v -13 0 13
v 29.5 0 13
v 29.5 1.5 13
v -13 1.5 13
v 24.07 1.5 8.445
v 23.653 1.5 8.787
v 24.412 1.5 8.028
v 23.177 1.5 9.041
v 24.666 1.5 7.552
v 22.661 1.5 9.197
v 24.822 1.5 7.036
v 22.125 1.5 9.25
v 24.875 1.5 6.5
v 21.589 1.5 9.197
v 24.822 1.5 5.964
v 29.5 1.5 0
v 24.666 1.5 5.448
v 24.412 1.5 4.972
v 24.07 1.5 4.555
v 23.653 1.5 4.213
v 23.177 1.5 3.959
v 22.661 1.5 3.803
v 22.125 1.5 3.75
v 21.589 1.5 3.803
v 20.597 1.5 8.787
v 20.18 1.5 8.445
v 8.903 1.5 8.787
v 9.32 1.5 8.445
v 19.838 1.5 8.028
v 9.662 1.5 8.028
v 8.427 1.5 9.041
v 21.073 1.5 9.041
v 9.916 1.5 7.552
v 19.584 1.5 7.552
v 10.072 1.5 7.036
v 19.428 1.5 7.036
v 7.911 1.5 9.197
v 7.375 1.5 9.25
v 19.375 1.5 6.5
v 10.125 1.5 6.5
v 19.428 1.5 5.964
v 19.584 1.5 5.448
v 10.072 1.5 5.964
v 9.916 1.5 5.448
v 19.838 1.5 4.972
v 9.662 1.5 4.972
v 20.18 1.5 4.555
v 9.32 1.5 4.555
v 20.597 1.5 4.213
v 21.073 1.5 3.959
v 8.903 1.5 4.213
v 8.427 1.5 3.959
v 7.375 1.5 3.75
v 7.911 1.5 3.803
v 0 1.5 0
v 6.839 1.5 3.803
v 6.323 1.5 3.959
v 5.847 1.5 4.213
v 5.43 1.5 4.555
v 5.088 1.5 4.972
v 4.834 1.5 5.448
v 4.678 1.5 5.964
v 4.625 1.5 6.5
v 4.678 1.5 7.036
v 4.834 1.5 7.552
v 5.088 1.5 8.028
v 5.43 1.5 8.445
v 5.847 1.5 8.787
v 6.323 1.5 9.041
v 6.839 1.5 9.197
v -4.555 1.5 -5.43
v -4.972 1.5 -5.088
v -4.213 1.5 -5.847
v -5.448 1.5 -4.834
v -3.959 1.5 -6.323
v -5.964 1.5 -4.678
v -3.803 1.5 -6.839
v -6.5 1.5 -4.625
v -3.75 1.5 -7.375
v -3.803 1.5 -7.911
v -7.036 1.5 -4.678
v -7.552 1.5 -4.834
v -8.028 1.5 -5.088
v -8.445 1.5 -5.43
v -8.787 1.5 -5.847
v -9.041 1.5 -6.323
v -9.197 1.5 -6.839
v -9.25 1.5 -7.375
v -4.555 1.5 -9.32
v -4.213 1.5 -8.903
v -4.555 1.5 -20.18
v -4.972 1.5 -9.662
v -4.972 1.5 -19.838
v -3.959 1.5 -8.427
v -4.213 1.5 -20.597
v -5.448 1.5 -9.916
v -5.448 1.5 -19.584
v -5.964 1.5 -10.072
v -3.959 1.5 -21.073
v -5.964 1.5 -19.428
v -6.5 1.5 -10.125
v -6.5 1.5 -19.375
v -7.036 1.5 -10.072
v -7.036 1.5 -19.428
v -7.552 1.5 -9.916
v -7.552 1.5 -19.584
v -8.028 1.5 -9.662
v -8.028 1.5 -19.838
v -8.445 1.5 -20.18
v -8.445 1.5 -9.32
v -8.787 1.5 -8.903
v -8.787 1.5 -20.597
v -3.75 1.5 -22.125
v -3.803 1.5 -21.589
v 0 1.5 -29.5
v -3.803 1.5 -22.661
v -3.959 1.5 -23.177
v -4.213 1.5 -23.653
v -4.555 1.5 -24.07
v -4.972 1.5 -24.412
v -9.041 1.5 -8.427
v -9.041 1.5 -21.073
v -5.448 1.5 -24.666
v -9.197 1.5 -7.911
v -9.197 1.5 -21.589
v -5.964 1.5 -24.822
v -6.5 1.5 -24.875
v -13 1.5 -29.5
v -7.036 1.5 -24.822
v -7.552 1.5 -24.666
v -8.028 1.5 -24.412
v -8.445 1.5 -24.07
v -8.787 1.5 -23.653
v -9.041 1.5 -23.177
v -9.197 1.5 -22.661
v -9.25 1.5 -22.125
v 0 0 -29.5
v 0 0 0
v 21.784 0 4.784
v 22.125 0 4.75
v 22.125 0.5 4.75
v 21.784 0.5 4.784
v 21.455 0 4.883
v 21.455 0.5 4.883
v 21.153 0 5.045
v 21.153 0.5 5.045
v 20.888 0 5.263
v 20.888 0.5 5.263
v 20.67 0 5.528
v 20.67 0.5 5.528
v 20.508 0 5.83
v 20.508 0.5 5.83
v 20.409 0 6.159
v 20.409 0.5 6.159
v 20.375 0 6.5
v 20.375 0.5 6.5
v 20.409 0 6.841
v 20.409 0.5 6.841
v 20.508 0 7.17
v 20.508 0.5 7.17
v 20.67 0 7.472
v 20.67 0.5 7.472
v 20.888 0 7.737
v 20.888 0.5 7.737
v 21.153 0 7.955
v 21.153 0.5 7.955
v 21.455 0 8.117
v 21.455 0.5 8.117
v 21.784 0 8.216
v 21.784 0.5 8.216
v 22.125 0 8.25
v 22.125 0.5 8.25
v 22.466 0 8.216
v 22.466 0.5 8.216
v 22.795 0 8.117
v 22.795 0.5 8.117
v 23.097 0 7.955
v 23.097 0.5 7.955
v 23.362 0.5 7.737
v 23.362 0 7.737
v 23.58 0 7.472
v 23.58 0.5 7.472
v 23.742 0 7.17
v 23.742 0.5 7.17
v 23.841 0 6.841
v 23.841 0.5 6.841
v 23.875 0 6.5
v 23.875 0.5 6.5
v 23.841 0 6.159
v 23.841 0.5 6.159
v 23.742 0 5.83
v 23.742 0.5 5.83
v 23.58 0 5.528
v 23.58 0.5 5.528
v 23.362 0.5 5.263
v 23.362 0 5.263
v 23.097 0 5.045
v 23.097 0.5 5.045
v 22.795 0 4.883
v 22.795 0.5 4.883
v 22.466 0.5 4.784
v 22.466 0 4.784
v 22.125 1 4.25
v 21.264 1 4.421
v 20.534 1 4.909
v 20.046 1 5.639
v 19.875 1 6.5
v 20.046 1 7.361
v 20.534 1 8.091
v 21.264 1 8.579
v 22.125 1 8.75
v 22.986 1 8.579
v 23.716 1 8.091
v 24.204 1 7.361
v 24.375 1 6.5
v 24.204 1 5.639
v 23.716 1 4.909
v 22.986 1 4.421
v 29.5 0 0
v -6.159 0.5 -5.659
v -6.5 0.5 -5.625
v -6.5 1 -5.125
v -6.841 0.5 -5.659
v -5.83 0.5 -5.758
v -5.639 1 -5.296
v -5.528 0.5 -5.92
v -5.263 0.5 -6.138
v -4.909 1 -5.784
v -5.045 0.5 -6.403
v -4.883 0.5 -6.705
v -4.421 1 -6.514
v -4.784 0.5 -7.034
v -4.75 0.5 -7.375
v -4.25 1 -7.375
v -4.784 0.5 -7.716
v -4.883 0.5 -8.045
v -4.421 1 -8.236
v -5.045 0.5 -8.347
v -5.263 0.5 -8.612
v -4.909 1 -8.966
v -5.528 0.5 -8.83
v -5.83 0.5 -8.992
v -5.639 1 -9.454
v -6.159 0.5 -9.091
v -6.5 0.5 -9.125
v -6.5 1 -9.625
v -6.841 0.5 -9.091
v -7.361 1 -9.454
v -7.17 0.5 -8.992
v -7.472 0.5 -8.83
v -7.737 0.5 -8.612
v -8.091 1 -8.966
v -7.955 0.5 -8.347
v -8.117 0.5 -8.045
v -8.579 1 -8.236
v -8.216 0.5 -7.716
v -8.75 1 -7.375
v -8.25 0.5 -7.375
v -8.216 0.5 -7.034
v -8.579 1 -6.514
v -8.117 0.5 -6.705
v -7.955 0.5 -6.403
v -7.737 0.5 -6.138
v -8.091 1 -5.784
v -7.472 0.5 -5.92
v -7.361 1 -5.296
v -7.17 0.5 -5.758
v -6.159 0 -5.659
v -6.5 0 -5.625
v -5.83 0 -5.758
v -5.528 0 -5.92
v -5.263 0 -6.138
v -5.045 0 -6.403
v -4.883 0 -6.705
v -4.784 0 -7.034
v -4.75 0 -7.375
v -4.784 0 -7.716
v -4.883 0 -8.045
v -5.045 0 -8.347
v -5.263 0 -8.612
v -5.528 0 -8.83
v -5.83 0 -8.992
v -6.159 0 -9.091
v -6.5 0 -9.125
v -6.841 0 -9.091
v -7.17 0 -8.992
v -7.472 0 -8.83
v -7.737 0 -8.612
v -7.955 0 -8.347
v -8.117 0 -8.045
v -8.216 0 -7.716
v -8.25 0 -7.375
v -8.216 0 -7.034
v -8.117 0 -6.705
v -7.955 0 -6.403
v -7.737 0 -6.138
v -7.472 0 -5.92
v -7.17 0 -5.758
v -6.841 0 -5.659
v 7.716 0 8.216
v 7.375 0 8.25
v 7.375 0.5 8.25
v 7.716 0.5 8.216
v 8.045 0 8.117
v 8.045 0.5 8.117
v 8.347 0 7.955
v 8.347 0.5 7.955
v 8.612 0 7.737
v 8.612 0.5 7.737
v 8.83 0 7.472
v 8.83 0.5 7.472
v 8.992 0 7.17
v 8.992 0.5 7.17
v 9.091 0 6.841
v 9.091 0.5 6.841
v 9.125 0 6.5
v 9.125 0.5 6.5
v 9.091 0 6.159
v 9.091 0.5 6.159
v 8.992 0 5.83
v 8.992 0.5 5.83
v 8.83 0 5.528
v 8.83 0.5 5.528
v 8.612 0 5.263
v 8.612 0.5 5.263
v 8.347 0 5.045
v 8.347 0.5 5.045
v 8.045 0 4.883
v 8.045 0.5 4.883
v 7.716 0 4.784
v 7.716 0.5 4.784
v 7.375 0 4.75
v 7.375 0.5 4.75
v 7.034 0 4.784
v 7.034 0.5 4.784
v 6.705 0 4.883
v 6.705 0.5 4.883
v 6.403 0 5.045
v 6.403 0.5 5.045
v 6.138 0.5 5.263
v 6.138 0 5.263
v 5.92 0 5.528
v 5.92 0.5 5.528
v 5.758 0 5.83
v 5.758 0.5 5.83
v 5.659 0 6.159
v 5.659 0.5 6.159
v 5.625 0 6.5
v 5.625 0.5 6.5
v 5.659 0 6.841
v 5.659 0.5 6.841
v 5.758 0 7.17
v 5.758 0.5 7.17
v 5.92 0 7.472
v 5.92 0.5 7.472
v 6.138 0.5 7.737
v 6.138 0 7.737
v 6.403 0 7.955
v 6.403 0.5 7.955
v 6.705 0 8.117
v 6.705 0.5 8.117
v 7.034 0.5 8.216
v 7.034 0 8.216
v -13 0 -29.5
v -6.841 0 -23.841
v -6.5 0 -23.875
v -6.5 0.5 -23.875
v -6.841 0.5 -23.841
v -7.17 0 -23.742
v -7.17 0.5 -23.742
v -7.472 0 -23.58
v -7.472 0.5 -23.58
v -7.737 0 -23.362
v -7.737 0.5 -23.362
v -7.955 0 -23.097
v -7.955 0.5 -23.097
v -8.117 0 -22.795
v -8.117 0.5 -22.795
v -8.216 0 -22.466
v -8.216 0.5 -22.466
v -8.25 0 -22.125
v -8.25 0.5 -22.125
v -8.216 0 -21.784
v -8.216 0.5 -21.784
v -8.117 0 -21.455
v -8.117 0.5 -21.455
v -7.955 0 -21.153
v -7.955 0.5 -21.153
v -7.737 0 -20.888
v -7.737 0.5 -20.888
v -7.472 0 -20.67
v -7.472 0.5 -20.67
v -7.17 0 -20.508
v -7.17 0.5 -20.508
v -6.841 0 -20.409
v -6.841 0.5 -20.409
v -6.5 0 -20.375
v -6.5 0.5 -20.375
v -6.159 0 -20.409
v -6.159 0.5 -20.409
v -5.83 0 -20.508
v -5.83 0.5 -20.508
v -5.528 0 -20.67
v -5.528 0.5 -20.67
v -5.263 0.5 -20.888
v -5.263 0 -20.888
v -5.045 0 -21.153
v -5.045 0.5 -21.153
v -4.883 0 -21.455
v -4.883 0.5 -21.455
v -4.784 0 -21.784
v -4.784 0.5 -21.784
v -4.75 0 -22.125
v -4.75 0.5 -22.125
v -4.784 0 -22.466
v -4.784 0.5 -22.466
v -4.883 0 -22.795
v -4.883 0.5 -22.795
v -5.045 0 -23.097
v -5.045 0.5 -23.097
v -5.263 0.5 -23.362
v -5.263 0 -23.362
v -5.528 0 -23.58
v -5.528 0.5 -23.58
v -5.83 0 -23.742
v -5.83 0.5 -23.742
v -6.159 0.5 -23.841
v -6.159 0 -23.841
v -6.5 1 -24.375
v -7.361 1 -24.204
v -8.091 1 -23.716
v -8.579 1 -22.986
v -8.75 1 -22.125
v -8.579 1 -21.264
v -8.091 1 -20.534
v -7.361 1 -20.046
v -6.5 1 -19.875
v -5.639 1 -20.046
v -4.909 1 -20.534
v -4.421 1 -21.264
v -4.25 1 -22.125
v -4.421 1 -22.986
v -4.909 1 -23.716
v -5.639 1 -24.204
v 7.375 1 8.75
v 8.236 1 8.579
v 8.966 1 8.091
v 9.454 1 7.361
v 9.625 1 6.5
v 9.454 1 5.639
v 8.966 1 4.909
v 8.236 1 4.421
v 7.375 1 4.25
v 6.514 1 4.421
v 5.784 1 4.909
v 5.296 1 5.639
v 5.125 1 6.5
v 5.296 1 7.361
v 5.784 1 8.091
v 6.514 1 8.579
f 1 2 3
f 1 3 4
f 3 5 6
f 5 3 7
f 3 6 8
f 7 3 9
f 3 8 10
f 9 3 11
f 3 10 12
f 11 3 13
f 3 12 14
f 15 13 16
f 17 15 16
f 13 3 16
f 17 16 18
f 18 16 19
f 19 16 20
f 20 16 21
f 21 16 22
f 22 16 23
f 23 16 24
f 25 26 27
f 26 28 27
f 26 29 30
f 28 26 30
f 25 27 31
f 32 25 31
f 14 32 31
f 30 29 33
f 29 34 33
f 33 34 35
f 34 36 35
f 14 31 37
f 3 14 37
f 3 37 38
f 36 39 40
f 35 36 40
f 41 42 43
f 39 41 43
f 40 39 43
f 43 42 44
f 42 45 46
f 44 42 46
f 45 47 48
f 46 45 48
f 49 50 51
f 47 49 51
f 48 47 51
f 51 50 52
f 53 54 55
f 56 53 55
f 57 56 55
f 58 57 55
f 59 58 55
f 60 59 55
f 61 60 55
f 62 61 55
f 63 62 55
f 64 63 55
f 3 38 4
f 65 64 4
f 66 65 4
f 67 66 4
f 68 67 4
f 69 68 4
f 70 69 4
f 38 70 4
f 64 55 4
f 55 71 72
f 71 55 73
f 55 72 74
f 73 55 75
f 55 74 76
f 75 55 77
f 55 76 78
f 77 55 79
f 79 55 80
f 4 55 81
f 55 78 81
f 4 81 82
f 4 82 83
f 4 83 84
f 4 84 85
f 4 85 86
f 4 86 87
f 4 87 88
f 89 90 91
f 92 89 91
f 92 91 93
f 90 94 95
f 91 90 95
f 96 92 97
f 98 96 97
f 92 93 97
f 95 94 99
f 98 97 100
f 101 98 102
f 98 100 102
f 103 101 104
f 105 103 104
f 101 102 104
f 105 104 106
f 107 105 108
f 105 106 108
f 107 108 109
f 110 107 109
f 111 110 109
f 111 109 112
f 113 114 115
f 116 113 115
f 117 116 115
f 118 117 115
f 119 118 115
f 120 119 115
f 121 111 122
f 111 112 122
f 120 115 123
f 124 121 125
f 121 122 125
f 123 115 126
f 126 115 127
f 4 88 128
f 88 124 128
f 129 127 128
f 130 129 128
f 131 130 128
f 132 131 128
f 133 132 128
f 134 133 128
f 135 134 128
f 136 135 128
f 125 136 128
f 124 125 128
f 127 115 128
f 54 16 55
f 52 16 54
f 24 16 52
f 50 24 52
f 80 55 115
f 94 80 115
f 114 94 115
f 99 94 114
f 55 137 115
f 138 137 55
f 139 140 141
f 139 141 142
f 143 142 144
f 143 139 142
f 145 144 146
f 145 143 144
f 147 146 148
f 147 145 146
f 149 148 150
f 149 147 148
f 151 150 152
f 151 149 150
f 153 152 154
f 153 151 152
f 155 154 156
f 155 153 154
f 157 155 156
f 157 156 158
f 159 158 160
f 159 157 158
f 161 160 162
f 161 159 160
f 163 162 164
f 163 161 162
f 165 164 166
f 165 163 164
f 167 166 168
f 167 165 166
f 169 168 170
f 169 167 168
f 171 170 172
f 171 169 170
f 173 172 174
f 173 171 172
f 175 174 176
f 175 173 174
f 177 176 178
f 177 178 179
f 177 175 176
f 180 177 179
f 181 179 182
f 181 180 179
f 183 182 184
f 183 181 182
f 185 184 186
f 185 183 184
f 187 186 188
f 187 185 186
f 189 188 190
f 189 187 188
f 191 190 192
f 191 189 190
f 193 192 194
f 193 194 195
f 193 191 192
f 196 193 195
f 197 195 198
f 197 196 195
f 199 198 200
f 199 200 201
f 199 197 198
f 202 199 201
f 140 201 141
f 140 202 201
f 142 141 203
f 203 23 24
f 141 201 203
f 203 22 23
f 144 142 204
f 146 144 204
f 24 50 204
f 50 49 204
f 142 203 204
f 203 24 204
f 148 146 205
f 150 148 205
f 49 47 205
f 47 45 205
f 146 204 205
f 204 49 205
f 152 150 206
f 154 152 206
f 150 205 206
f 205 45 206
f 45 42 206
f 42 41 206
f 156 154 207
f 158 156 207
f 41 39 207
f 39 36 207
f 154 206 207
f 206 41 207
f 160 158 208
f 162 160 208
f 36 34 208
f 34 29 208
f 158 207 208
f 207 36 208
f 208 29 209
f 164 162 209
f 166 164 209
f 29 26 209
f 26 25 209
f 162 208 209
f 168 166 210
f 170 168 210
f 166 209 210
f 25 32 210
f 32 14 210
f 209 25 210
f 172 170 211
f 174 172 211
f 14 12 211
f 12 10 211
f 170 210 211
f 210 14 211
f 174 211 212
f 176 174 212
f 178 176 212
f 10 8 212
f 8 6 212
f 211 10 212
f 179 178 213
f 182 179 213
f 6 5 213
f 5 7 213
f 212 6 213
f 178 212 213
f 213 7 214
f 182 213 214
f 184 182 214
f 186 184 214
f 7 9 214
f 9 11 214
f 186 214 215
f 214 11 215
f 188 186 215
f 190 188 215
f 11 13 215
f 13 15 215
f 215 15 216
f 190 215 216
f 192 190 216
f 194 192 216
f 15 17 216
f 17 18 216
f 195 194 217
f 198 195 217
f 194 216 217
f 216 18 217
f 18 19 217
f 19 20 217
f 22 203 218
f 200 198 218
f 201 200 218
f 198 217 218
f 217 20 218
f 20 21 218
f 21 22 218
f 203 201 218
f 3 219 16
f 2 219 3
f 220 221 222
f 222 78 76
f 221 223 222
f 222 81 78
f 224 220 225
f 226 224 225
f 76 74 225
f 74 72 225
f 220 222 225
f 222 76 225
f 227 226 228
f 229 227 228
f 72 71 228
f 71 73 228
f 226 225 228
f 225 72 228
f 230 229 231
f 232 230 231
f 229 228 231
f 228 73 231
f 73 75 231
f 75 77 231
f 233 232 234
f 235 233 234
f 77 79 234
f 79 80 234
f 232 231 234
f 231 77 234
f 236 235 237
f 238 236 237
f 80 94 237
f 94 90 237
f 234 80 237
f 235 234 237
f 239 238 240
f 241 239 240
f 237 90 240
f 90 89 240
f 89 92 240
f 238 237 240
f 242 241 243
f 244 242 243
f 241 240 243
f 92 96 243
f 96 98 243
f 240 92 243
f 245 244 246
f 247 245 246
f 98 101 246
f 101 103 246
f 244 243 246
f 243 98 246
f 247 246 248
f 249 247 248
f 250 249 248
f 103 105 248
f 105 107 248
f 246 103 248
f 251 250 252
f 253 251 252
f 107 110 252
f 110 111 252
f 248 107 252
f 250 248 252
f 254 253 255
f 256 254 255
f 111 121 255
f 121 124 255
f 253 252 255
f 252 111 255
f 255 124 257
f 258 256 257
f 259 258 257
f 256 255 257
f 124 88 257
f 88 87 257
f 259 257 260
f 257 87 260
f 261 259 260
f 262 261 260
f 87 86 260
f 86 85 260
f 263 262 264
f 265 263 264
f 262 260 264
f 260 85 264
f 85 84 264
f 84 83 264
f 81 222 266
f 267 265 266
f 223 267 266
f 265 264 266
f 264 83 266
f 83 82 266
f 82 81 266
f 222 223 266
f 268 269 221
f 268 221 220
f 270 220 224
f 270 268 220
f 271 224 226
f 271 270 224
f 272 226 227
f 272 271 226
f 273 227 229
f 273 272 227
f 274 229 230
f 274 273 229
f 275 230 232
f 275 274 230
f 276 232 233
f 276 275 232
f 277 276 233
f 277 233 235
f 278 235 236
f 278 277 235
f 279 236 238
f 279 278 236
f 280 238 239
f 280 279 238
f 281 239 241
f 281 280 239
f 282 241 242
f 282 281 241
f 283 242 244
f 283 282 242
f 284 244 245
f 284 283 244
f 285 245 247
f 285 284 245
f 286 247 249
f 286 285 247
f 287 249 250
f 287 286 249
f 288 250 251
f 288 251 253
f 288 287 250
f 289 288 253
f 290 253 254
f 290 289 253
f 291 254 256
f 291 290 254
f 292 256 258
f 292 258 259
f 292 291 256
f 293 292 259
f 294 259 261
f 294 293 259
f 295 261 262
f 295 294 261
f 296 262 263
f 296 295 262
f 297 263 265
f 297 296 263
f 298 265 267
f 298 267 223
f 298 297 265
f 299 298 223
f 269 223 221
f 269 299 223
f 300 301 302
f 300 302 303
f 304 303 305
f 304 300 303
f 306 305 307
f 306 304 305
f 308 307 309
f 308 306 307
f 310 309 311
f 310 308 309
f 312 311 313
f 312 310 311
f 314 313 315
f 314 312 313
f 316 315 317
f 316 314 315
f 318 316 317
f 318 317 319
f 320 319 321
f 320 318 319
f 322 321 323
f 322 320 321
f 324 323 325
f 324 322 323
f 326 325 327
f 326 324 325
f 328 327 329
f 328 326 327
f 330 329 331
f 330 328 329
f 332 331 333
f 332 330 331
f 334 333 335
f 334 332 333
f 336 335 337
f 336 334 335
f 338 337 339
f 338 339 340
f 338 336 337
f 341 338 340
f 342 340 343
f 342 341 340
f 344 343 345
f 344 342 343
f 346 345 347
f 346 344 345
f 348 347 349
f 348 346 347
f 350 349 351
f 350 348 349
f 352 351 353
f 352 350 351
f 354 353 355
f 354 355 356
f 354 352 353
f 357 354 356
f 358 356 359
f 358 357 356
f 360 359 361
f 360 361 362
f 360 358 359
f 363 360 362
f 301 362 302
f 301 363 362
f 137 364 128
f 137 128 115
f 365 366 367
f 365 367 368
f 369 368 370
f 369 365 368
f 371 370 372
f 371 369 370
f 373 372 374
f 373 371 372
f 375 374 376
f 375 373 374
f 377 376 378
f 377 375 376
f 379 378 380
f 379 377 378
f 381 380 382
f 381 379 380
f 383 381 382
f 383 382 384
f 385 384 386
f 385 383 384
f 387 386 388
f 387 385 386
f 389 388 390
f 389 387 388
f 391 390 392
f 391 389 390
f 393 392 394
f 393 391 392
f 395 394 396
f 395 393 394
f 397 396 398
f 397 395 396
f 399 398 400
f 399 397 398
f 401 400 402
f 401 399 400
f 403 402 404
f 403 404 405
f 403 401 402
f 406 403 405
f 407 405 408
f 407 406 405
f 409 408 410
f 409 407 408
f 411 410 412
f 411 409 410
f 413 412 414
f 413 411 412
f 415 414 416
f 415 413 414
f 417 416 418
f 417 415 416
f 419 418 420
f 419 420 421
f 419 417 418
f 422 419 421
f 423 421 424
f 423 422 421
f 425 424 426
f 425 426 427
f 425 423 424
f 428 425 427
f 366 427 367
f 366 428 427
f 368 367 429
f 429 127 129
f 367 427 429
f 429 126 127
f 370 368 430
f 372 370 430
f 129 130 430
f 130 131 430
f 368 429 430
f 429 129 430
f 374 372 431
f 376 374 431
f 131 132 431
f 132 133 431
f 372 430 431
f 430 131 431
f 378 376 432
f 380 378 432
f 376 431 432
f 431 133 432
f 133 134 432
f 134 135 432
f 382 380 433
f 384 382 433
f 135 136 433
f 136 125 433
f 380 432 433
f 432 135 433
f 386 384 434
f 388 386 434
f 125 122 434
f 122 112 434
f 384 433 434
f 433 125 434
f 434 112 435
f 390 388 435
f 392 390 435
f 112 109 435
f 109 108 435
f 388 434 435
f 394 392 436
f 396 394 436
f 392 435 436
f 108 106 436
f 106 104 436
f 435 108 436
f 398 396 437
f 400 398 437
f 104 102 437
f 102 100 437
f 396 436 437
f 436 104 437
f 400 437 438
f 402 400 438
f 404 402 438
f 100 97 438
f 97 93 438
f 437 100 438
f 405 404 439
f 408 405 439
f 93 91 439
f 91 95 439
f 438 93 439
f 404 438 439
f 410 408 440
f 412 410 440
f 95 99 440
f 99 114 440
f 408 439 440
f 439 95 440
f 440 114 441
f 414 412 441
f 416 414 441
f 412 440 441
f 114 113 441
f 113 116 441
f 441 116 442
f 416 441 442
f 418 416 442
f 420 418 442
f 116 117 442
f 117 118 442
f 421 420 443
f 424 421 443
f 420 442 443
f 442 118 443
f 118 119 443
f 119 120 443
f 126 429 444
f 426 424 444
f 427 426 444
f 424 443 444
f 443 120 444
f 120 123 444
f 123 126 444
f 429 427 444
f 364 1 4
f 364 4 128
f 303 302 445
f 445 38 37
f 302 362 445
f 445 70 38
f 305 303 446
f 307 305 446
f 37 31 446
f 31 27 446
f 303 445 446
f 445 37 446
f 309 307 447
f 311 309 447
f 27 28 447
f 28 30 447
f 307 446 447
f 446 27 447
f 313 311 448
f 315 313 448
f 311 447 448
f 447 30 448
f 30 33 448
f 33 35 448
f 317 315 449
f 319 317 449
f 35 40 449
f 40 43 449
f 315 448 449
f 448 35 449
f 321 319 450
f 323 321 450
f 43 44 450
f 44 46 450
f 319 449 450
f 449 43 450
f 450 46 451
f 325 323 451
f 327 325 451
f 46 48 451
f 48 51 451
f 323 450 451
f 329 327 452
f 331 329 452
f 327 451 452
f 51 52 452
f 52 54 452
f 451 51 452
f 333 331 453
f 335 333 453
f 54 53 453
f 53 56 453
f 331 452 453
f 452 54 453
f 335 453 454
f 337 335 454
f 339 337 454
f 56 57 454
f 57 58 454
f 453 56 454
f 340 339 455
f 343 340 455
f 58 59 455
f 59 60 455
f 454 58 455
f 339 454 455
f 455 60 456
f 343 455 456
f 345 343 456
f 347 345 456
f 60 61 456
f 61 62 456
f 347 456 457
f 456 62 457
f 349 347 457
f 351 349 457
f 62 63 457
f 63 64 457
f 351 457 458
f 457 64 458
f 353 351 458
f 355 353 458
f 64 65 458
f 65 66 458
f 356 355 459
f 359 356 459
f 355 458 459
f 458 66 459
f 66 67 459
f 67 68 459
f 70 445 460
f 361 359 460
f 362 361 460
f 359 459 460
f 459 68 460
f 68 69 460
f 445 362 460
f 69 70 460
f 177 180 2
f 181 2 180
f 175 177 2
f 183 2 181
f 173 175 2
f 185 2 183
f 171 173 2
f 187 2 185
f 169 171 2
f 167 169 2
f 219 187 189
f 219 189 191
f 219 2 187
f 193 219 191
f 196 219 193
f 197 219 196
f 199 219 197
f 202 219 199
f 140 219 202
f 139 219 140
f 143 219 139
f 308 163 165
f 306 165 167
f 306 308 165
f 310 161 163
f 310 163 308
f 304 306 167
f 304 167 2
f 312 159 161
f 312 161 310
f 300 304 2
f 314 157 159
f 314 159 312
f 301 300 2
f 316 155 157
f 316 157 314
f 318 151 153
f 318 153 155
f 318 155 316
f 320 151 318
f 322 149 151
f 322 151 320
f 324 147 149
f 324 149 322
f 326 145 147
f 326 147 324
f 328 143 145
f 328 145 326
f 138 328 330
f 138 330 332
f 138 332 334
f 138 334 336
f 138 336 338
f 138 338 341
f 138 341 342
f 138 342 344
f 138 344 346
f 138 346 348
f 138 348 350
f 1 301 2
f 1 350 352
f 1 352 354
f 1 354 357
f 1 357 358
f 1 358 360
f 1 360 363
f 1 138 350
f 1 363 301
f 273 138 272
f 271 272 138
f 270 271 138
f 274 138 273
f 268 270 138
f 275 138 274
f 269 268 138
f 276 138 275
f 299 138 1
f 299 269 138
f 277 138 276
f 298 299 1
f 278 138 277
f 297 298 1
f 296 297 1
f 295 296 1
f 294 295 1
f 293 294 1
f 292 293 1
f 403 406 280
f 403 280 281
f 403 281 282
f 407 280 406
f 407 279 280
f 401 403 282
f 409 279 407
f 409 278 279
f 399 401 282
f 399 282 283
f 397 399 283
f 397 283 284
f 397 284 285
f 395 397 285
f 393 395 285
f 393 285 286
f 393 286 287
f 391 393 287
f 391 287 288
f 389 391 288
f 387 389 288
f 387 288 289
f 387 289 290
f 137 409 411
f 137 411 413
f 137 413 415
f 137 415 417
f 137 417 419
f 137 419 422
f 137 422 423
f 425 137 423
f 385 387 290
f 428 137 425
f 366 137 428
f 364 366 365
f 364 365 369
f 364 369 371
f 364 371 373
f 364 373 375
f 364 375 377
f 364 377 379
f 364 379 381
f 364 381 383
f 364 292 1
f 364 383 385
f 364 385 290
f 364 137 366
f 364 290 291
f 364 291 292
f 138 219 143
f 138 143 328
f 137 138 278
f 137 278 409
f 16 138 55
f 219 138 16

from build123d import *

# Parameters (mm, degrees)
SKETCH1_R           = 1.75
BOSS_EXTRUDE1_DEPTH = 1.5
CHAMFER1_SIZE       = 1


with BuildPart() as part:
    # Sketch1 → Boss-Extrude1 (new body)
    with BuildSketch(Plane(origin=(0, 0, 0), x_dir=(1, 0, 0), z_dir=(0, 1, 0))):
        Polygon((0, 0), (29.5, 0), (29.5, -13), (-13, -13), (-13, 29.5), (0, 29.5), align=None)
        with Locations(Location((-6.5, 7.375, 0), (0, 0, 270))):
            Circle(SKETCH1_R, mode=Mode.SUBTRACT)
        with Locations(Location((7.375, -6.5, 0), (0, 0, 270))):
            Circle(SKETCH1_R, mode=Mode.SUBTRACT)
        with Locations(Location((-6.5, 22.125, 0), (0, 0, 90))):
            Circle(SKETCH1_R, mode=Mode.SUBTRACT)
        with Locations(Location((22.125, -6.5, 0), (0, 0, 90))):
            Circle(SKETCH1_R, mode=Mode.SUBTRACT)
    extrude(amount=BOSS_EXTRUDE1_DEPTH)

    # Chamfer1
    chamfer1_edges = [part.edges().sort_by_distance(p)[0] for p in [
        (-6.5, 1.5, -9.125),
        (7.375, 1.5, 4.75),
        (-6.5, 1.5, -20.375),
        (22.125, 1.5, 8.25),
    ]]
    chamfer(chamfer1_edges, length=CHAMFER1_SIZE)


solid = part.part
